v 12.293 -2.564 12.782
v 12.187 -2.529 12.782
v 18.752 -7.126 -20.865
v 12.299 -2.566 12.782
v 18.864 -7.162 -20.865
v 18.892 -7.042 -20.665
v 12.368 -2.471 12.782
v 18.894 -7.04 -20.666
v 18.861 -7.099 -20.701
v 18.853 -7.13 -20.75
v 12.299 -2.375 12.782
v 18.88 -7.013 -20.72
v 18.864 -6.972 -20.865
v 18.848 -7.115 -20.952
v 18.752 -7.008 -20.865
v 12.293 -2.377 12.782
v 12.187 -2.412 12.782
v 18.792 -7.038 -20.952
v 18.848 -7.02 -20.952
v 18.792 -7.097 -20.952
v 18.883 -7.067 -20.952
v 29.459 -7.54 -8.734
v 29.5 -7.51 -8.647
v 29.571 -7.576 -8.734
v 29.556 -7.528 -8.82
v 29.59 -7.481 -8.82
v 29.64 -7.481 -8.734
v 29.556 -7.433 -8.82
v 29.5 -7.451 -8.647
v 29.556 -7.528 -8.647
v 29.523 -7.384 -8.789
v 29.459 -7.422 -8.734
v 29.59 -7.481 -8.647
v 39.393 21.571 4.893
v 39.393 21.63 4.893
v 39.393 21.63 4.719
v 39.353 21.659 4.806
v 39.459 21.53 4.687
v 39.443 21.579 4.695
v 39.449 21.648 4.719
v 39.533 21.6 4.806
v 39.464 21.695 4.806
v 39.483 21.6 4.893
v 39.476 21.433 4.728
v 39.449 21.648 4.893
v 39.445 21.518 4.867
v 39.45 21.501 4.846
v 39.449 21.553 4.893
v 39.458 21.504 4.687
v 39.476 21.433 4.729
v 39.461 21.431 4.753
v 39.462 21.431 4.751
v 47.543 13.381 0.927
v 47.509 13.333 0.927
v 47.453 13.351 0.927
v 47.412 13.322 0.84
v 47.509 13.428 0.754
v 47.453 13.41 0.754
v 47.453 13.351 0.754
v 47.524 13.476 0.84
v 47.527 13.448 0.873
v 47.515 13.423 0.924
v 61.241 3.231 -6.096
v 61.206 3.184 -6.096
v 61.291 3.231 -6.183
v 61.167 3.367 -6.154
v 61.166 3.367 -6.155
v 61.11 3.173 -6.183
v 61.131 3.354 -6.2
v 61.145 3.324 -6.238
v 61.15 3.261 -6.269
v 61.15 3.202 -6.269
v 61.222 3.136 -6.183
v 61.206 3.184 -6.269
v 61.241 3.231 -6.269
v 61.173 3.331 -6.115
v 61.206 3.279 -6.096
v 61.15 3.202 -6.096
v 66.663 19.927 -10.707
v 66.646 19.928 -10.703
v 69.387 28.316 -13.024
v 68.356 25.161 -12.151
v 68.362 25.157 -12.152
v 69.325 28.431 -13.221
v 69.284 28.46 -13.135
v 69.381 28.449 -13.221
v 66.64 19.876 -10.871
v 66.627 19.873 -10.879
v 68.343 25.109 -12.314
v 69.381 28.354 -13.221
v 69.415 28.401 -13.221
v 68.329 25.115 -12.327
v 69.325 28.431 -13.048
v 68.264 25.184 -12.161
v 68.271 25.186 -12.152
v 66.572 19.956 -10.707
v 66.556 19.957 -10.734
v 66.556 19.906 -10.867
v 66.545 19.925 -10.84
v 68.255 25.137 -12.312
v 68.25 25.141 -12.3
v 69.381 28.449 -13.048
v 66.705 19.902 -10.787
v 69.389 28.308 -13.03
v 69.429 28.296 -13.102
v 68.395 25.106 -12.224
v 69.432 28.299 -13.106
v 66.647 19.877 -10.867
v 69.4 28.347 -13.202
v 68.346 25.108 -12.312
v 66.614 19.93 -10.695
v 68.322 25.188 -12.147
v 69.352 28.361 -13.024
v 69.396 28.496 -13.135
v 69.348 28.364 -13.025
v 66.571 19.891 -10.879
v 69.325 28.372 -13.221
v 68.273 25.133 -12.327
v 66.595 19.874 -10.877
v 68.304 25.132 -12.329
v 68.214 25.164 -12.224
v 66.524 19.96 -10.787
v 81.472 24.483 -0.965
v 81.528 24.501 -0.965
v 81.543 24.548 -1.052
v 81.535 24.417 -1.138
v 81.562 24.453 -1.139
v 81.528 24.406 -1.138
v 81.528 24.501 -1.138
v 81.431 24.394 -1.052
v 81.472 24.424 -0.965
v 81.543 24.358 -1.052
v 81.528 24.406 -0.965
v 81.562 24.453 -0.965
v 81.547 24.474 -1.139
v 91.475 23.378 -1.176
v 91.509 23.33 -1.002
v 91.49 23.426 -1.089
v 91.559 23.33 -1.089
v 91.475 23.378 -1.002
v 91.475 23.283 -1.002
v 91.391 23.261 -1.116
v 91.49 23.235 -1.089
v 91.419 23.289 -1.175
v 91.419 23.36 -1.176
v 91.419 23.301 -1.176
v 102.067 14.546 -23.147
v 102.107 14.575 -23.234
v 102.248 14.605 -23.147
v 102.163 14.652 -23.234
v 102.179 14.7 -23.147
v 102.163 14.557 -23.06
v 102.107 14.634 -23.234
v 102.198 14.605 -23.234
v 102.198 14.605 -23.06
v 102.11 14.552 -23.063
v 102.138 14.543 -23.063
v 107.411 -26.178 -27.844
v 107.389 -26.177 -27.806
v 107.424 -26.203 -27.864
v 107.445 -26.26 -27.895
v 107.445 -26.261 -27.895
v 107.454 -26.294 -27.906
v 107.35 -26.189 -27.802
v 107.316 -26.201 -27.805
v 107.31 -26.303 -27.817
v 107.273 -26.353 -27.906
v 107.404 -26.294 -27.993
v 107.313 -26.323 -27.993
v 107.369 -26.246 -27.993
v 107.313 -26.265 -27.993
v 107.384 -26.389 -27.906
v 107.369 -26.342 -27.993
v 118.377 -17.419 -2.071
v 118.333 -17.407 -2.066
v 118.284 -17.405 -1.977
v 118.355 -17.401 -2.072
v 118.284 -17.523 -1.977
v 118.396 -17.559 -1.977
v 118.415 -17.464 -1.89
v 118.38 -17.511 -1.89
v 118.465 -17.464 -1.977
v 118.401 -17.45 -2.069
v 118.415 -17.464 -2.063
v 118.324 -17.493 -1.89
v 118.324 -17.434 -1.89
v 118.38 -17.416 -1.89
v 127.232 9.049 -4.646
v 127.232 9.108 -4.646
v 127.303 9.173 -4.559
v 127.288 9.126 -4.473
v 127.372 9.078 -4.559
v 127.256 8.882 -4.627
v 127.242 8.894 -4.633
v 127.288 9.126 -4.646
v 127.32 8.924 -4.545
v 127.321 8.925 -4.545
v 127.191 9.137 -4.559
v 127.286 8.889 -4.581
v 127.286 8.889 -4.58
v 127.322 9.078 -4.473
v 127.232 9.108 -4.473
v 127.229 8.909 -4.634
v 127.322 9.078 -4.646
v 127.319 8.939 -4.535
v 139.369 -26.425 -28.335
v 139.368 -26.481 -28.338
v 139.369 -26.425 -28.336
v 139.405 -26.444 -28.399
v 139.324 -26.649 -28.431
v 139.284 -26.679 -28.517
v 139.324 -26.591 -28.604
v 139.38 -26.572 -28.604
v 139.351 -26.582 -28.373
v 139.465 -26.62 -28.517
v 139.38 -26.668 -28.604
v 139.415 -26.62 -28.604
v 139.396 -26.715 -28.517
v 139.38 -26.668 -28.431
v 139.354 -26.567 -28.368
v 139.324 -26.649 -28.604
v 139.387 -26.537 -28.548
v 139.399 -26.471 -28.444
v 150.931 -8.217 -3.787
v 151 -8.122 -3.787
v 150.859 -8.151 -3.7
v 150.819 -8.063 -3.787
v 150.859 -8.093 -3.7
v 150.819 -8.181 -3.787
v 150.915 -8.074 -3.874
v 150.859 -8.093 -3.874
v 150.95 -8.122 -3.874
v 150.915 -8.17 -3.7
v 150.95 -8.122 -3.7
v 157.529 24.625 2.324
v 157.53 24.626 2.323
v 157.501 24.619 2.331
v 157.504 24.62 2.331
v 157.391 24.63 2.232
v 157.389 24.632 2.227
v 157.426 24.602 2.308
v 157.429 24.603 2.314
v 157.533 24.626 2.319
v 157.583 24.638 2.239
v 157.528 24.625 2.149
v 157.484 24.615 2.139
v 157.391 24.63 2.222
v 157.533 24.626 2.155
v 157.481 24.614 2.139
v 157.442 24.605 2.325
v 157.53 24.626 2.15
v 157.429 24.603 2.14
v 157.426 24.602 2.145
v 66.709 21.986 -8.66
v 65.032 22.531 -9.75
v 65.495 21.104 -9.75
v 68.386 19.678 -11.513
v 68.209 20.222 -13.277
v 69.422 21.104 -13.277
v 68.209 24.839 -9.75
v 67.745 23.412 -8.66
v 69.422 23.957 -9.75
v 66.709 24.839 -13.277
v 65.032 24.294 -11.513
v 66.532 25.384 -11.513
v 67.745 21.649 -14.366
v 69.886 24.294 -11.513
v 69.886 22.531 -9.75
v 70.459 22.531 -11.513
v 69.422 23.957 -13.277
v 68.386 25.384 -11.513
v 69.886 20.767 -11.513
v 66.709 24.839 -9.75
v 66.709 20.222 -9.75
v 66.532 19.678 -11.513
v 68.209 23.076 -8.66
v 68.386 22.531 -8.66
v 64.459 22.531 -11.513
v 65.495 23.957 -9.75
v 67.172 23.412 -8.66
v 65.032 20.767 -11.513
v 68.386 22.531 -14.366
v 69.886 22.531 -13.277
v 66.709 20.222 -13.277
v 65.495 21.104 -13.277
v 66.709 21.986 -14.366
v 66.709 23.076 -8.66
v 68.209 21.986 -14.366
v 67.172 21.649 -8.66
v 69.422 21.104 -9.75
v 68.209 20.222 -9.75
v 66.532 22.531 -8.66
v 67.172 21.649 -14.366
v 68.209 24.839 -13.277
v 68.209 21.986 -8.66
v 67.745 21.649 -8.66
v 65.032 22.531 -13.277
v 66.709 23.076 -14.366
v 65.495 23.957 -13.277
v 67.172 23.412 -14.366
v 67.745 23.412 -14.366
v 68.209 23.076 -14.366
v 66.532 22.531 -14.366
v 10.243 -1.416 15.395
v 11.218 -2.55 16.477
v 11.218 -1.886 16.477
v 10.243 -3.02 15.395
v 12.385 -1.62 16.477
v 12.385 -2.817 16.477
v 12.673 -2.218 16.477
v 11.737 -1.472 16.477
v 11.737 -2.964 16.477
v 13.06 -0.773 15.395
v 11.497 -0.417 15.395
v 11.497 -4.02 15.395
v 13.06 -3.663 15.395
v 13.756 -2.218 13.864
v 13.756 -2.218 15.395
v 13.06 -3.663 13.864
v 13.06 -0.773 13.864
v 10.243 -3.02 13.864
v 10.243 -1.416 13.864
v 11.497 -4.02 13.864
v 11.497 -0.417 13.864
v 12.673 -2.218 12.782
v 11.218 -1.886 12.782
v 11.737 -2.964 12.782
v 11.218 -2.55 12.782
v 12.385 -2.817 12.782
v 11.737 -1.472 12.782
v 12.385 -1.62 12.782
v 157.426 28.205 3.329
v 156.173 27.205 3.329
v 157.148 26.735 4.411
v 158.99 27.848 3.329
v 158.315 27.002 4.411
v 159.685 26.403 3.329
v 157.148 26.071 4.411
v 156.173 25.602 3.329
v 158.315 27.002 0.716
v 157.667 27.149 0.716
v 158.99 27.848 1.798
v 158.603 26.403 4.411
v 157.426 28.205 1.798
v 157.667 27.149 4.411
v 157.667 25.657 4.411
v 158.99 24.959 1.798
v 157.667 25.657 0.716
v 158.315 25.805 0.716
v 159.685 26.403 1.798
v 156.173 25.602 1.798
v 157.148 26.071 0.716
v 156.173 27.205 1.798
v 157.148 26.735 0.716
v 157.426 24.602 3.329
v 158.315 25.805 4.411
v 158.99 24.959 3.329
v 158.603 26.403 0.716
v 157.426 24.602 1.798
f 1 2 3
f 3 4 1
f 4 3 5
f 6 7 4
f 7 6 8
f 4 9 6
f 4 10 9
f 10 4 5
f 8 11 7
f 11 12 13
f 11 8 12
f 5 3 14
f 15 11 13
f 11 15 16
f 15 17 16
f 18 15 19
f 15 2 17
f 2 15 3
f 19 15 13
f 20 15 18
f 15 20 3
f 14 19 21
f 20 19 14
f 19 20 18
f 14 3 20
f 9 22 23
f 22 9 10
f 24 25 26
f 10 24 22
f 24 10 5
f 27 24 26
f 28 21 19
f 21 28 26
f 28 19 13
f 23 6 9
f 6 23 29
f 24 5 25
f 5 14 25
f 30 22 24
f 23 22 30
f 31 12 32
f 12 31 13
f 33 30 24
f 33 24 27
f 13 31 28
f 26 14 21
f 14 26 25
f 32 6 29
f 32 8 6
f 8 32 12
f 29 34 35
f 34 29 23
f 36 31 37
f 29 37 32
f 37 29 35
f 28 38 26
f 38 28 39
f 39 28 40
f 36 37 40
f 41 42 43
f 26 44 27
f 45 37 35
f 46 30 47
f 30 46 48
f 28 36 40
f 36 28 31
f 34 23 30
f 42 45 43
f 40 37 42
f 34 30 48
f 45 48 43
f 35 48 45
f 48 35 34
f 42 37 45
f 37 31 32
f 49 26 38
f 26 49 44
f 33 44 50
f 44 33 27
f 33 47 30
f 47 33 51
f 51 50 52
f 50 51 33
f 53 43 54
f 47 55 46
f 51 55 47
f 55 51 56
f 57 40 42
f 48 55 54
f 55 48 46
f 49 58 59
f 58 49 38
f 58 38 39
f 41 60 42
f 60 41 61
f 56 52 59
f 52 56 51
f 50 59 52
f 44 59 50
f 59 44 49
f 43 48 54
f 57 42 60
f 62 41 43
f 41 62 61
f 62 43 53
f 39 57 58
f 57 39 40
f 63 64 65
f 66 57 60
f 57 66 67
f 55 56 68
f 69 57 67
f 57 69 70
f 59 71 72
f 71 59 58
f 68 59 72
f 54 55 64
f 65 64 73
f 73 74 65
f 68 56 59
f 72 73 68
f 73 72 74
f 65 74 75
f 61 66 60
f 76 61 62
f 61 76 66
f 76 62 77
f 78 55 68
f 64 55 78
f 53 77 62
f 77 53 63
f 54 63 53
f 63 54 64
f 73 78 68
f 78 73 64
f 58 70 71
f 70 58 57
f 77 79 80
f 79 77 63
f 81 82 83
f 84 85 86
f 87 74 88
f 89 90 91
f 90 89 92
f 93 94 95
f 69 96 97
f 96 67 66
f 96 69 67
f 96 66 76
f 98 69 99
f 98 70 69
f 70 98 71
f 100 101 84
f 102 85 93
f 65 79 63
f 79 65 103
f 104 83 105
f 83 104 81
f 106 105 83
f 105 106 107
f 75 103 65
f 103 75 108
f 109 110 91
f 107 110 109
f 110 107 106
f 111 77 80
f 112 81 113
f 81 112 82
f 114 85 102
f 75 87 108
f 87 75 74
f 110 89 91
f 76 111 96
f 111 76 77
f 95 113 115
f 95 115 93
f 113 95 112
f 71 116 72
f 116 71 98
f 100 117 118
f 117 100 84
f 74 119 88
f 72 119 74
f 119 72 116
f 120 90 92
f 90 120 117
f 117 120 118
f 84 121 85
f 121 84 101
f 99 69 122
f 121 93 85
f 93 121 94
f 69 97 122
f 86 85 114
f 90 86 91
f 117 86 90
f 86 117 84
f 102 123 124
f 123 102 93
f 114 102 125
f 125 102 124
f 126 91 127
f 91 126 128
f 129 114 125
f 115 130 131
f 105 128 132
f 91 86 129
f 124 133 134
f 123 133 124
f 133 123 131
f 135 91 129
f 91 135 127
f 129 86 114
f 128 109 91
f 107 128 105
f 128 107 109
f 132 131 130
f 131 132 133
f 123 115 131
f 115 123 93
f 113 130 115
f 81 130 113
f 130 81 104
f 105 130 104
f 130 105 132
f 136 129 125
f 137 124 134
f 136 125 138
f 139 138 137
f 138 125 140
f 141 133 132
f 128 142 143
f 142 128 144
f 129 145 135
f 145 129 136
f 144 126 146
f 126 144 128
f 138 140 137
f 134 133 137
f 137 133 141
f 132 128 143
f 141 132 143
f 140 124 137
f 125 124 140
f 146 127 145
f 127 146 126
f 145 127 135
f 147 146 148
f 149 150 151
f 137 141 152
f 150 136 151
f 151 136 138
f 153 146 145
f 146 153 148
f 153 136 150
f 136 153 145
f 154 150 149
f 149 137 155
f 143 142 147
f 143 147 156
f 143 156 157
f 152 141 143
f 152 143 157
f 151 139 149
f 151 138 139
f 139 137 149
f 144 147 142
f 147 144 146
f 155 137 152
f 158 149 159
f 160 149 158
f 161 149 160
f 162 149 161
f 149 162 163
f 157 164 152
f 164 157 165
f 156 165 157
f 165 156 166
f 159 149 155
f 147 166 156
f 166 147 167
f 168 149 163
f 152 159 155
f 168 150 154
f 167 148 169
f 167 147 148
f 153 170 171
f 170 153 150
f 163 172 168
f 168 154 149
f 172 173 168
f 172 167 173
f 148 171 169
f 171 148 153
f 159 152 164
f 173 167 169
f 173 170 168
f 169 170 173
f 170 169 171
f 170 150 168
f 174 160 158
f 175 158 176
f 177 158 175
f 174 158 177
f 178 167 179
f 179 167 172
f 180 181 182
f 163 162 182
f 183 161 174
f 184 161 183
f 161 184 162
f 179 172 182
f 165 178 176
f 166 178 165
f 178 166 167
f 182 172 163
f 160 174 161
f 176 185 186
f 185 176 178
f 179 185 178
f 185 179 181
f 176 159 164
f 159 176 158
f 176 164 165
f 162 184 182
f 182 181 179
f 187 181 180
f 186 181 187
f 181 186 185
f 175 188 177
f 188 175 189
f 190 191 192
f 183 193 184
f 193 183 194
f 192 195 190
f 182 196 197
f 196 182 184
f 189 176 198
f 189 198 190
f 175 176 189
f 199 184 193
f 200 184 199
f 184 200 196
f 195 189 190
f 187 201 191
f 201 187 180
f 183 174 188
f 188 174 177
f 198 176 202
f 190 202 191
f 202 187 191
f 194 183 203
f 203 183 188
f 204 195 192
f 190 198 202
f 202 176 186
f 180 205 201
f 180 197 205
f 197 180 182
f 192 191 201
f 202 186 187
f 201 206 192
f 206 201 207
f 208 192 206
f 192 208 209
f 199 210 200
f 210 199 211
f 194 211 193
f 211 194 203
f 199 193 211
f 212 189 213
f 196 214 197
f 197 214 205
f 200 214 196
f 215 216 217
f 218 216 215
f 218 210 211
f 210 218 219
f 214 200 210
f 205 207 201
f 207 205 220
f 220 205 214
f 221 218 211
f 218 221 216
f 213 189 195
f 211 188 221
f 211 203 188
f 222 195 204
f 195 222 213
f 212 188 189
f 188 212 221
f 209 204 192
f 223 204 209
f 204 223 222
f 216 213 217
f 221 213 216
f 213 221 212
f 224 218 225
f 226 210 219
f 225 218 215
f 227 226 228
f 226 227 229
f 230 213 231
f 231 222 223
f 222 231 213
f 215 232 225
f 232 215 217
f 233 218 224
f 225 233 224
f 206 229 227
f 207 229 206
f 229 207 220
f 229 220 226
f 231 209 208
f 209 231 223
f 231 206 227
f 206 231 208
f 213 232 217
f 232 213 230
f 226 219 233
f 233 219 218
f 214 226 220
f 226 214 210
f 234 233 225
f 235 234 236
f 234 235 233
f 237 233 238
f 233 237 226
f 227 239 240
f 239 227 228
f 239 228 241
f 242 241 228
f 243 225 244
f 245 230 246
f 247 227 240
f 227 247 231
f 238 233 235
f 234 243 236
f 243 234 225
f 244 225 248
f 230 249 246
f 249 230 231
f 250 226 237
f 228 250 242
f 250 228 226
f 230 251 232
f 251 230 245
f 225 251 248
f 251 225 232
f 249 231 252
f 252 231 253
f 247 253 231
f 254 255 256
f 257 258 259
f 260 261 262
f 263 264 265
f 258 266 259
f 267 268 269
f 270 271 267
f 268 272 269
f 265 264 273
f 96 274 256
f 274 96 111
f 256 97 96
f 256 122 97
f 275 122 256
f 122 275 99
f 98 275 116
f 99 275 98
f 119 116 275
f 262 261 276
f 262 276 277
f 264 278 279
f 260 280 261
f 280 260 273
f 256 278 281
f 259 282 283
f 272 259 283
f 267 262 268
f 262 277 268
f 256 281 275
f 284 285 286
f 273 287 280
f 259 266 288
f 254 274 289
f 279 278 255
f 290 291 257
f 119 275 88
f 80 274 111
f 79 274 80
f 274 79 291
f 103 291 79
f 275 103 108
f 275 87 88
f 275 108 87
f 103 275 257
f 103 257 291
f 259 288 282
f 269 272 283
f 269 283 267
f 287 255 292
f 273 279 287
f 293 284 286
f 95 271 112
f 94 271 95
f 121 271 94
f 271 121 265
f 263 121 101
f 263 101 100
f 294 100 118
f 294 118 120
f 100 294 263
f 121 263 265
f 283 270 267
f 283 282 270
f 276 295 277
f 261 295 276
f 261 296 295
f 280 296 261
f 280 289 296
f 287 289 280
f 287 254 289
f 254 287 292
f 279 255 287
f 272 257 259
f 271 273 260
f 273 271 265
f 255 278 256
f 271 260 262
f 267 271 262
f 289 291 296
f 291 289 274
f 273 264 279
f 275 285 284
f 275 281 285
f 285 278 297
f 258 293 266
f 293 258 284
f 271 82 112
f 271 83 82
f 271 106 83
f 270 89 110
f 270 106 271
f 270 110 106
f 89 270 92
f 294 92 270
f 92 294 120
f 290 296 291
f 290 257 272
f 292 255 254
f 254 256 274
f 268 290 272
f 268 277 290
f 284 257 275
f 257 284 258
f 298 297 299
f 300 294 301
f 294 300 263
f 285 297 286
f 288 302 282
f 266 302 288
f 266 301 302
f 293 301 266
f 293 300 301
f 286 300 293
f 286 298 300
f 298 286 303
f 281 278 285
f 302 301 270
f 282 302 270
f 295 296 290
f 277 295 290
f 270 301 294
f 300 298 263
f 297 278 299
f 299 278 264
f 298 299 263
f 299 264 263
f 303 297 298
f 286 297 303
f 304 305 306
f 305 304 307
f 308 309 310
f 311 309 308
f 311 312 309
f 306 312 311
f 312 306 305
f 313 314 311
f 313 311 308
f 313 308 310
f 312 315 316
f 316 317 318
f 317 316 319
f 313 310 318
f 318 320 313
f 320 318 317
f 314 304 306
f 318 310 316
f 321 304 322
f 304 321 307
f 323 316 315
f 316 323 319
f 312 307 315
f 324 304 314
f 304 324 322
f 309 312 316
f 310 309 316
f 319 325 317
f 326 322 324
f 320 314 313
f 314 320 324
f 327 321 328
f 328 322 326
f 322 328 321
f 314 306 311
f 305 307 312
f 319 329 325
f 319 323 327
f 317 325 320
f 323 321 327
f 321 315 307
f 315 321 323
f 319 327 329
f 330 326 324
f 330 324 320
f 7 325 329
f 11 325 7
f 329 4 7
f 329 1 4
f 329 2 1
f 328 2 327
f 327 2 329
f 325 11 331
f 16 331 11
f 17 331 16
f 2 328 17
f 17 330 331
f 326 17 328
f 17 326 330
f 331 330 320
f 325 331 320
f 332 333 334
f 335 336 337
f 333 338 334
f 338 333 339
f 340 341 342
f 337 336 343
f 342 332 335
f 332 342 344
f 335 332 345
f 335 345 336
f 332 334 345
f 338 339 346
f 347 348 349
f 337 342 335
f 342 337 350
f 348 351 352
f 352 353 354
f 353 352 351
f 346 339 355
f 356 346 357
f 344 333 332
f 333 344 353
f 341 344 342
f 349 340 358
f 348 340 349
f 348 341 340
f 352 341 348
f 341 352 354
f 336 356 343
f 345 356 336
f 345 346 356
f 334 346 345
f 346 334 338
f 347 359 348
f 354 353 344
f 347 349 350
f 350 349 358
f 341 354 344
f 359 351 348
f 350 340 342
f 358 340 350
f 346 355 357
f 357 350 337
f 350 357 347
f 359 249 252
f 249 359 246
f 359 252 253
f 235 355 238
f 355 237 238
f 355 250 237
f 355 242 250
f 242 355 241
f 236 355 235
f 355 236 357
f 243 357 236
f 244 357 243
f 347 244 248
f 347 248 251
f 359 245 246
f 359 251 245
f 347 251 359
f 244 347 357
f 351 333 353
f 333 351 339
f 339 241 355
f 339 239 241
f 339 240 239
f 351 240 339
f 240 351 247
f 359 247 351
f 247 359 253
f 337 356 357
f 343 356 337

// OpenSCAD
 



My_poly_line=make_points(16);
LengthOfIt=(len3v(My_poly_line));
Far_Along=rnd(1);
My_Point_Exactly=v2t(My_poly_line,LengthOfIt*Far_Along);
echo( str(round(Far_Along*100),"% "),My_Point_Exactly);
polyline(My_poly_line);
translate(My_Point_Exactly)color("gold")sphere(3);
translate(My_poly_line[0])color("red")sphere(2);
translate(My_poly_line[len(My_poly_line)-1])color("blue")sphere(2);

module line(p1, p2 ,width=0.1) { hull() {        
translate(p1) sphere(width);
translate(p2) sphere(width);    }}

module polyline(p) {for(i=[0:max(0,len(p)-2)])line(p[i],p[i+1]);}

function un(v)=v/max(1e-15,norm(v));
function len3v(v,acc=0,p=0)=p+1>len(v)-1?
        acc: len3v(v,acc+norm(v[p]-v[p+1]),p+1)  ;
function v2t(v,stop,p=0)=p+1>len(v)-1|| norm(v[p]-v[p+1])>stop?  
 v[p]+un(v[p+1]-v[p])*stop:v2t(v,stop-norm(v[p]-v[p+1]),p+1);
function make_points(j=10,l1=[-30,-30,-30],l2=[30,30,30])= 
     ([for(i=[1:j])[
rnd(l1.x,l2.x)/10+i*10,
rnd(l1.y,l2.y),
rnd(l1.z,l2.z)]]);
function rnd(a = 1, b = 0, s = []) = 
  s == [] ? 
   (rands(min(a, b), max(   a, b), 1)[0]) 
  : 
   (rands(min(a, b), max(a, b), 1, s)[0])
  ; 

module line(p1, p2 ,width=0.1) { hull() {        
translate(p1) sphere(width);
translate(p2) sphere(width);    }}

module polyline(p) {for(i=[0:max(0,len(p)-2)])line(p[i],p[i+1]);}
 
